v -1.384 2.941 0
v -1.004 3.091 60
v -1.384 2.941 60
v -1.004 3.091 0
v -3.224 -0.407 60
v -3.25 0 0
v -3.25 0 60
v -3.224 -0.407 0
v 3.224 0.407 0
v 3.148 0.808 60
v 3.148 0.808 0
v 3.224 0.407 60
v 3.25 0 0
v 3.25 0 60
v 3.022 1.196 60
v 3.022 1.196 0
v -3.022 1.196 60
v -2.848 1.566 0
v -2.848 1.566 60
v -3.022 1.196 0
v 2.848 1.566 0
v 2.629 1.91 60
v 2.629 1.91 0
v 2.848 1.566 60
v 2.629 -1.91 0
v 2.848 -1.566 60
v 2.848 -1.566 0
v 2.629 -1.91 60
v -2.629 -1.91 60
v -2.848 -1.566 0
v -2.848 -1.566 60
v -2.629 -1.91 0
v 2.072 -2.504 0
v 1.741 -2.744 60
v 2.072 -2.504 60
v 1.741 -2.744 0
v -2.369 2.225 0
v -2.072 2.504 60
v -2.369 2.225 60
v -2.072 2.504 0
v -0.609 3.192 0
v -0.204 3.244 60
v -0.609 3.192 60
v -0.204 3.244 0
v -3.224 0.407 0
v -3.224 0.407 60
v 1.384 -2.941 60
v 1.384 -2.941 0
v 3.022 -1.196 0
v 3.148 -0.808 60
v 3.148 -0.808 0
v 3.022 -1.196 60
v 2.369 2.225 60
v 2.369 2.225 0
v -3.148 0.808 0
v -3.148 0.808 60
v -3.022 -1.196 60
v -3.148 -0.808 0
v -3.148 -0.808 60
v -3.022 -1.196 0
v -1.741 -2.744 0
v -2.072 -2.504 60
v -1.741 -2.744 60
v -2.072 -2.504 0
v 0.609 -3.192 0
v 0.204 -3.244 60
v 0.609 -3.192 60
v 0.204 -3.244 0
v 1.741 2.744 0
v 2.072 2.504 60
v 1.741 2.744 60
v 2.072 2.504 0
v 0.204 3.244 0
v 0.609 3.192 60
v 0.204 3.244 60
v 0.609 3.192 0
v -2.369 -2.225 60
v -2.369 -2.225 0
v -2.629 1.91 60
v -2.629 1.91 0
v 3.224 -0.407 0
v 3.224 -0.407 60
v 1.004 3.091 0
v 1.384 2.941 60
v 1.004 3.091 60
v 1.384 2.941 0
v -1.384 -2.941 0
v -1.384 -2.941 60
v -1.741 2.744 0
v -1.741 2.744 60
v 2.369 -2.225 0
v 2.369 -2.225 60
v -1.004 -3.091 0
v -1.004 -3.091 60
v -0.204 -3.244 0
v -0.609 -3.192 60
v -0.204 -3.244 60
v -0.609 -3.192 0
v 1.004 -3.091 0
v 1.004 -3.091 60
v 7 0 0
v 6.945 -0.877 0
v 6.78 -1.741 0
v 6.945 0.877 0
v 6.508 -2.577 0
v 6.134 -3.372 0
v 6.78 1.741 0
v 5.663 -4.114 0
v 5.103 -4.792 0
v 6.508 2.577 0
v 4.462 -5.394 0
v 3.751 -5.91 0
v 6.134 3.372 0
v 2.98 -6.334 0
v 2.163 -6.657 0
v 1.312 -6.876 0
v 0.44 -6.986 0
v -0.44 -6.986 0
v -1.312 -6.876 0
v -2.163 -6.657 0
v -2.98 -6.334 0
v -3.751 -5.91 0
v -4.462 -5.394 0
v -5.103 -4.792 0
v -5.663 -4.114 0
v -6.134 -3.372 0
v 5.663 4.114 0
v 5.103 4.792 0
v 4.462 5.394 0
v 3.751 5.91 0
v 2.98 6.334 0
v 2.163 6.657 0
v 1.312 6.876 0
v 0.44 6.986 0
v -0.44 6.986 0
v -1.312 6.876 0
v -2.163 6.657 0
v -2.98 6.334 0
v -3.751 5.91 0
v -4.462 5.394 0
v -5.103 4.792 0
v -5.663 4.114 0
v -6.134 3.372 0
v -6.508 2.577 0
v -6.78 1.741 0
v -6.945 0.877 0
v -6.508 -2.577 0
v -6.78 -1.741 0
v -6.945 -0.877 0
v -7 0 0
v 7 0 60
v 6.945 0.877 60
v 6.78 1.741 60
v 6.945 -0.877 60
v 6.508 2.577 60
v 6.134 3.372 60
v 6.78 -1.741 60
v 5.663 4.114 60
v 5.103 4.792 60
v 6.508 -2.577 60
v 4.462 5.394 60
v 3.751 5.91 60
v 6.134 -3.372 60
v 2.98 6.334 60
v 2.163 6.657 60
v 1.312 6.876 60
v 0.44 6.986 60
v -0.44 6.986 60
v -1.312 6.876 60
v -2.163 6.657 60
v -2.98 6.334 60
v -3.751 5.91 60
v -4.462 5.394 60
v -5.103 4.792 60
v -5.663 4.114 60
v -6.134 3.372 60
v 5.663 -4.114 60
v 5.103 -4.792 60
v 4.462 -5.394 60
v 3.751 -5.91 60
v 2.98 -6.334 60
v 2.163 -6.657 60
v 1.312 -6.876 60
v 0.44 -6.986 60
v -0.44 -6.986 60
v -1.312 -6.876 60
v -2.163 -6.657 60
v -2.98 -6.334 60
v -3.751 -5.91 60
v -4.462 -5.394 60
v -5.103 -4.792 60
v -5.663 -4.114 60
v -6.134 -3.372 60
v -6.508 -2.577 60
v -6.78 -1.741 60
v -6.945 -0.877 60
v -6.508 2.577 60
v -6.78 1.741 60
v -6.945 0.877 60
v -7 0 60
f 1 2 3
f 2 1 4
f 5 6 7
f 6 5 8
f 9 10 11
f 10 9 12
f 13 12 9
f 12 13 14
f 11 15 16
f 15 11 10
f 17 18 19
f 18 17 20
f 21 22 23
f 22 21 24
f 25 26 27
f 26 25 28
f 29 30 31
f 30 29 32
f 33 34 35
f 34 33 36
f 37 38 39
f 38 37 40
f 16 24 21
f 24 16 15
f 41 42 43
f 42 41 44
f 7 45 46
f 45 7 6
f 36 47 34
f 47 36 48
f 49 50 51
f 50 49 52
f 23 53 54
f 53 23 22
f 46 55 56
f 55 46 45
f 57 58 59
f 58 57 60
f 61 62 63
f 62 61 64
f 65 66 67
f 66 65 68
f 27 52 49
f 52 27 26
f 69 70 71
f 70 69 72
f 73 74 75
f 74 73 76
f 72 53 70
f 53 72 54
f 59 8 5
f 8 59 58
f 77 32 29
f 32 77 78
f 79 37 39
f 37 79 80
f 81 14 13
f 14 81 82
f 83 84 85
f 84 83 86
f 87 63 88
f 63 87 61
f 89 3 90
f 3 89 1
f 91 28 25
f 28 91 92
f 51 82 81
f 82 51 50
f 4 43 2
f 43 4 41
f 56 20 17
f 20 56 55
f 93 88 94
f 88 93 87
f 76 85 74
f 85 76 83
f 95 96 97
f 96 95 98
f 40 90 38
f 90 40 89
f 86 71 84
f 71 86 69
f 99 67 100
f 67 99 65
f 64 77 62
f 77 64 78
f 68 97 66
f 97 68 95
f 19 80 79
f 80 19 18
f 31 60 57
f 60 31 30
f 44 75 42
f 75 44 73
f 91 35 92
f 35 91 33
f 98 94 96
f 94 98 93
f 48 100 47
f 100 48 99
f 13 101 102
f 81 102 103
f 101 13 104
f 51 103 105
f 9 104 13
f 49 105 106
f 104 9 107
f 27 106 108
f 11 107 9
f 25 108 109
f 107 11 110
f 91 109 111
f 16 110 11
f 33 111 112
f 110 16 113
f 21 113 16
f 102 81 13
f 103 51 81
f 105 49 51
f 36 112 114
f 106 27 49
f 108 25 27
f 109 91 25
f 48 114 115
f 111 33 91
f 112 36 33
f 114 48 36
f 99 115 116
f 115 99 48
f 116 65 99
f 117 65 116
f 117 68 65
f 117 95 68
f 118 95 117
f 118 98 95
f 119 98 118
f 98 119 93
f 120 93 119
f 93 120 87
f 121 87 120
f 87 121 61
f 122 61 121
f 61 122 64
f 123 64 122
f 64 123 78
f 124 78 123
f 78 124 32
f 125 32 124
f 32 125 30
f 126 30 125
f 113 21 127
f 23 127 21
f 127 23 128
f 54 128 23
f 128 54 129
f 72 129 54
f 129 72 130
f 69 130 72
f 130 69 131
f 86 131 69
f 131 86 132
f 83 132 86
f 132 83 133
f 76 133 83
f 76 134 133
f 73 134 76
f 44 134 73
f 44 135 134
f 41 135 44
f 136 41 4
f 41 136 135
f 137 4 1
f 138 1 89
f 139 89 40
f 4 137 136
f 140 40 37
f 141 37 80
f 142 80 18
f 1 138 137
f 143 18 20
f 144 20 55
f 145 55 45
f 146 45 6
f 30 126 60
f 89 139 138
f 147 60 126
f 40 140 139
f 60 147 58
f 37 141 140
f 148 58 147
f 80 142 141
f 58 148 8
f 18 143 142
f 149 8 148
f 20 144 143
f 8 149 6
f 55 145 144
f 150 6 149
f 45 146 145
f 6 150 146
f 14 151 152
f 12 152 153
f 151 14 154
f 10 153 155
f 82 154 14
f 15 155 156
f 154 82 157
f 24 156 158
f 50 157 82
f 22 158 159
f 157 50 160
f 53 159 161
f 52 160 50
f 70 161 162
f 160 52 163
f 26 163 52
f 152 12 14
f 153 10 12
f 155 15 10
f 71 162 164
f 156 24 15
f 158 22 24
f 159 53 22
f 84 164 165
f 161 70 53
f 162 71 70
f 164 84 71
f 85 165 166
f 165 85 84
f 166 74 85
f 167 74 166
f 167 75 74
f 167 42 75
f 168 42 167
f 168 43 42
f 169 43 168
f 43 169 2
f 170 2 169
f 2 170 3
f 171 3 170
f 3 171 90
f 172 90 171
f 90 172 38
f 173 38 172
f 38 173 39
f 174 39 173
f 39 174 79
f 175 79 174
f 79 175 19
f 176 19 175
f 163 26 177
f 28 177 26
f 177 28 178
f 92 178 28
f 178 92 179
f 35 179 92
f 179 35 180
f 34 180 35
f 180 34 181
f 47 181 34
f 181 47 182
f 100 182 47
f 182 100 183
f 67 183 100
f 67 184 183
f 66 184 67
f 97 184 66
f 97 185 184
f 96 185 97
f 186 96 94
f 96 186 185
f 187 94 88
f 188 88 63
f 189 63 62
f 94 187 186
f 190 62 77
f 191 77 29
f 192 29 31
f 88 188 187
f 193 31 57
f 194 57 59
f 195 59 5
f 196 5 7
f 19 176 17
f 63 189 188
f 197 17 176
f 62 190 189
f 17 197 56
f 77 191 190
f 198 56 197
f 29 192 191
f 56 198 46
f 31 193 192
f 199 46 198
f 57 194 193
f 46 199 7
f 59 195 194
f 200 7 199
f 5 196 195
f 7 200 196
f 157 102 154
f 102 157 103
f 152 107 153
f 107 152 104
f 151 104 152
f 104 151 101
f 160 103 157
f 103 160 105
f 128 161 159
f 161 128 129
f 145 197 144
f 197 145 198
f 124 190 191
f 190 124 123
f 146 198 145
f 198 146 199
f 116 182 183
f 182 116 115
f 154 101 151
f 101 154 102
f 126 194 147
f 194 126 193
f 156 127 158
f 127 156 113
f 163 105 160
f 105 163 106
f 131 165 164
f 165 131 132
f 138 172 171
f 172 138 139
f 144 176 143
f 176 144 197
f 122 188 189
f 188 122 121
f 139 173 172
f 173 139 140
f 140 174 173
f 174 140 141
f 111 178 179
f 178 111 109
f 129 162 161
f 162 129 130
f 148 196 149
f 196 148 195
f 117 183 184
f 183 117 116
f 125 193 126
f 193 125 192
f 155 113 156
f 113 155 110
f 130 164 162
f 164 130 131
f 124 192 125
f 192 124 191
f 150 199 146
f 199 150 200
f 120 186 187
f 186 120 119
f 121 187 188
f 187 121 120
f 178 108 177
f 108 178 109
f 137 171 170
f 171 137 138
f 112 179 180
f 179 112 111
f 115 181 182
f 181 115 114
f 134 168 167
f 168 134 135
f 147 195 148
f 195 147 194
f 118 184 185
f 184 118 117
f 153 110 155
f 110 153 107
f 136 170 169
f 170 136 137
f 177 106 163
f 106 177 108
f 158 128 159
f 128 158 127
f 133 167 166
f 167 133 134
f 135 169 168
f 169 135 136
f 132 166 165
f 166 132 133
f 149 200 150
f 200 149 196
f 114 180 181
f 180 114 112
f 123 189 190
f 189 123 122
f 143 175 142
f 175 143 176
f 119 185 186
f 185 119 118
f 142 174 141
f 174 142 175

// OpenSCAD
$fn = 50;


difference() {
	union() {
		cylinder(h = 60, r = 7.0000000000);
	}
	union() {
		cylinder(h = 60, r = 3.2500000000);
		cylinder(h = 60, r = 3.2500000000);
		cylinder(h = 60, r = 1.8000000000);
		cylinder(h = 60, r = 1.8000000000);
		cylinder(h = 60, r = 1.8000000000);
		cylinder(h = 60, r = 1.8000000000);
		cylinder(h = 60, r = 1.8000000000);
		cylinder(h = 60, r = 1.8000000000);
	}
}
